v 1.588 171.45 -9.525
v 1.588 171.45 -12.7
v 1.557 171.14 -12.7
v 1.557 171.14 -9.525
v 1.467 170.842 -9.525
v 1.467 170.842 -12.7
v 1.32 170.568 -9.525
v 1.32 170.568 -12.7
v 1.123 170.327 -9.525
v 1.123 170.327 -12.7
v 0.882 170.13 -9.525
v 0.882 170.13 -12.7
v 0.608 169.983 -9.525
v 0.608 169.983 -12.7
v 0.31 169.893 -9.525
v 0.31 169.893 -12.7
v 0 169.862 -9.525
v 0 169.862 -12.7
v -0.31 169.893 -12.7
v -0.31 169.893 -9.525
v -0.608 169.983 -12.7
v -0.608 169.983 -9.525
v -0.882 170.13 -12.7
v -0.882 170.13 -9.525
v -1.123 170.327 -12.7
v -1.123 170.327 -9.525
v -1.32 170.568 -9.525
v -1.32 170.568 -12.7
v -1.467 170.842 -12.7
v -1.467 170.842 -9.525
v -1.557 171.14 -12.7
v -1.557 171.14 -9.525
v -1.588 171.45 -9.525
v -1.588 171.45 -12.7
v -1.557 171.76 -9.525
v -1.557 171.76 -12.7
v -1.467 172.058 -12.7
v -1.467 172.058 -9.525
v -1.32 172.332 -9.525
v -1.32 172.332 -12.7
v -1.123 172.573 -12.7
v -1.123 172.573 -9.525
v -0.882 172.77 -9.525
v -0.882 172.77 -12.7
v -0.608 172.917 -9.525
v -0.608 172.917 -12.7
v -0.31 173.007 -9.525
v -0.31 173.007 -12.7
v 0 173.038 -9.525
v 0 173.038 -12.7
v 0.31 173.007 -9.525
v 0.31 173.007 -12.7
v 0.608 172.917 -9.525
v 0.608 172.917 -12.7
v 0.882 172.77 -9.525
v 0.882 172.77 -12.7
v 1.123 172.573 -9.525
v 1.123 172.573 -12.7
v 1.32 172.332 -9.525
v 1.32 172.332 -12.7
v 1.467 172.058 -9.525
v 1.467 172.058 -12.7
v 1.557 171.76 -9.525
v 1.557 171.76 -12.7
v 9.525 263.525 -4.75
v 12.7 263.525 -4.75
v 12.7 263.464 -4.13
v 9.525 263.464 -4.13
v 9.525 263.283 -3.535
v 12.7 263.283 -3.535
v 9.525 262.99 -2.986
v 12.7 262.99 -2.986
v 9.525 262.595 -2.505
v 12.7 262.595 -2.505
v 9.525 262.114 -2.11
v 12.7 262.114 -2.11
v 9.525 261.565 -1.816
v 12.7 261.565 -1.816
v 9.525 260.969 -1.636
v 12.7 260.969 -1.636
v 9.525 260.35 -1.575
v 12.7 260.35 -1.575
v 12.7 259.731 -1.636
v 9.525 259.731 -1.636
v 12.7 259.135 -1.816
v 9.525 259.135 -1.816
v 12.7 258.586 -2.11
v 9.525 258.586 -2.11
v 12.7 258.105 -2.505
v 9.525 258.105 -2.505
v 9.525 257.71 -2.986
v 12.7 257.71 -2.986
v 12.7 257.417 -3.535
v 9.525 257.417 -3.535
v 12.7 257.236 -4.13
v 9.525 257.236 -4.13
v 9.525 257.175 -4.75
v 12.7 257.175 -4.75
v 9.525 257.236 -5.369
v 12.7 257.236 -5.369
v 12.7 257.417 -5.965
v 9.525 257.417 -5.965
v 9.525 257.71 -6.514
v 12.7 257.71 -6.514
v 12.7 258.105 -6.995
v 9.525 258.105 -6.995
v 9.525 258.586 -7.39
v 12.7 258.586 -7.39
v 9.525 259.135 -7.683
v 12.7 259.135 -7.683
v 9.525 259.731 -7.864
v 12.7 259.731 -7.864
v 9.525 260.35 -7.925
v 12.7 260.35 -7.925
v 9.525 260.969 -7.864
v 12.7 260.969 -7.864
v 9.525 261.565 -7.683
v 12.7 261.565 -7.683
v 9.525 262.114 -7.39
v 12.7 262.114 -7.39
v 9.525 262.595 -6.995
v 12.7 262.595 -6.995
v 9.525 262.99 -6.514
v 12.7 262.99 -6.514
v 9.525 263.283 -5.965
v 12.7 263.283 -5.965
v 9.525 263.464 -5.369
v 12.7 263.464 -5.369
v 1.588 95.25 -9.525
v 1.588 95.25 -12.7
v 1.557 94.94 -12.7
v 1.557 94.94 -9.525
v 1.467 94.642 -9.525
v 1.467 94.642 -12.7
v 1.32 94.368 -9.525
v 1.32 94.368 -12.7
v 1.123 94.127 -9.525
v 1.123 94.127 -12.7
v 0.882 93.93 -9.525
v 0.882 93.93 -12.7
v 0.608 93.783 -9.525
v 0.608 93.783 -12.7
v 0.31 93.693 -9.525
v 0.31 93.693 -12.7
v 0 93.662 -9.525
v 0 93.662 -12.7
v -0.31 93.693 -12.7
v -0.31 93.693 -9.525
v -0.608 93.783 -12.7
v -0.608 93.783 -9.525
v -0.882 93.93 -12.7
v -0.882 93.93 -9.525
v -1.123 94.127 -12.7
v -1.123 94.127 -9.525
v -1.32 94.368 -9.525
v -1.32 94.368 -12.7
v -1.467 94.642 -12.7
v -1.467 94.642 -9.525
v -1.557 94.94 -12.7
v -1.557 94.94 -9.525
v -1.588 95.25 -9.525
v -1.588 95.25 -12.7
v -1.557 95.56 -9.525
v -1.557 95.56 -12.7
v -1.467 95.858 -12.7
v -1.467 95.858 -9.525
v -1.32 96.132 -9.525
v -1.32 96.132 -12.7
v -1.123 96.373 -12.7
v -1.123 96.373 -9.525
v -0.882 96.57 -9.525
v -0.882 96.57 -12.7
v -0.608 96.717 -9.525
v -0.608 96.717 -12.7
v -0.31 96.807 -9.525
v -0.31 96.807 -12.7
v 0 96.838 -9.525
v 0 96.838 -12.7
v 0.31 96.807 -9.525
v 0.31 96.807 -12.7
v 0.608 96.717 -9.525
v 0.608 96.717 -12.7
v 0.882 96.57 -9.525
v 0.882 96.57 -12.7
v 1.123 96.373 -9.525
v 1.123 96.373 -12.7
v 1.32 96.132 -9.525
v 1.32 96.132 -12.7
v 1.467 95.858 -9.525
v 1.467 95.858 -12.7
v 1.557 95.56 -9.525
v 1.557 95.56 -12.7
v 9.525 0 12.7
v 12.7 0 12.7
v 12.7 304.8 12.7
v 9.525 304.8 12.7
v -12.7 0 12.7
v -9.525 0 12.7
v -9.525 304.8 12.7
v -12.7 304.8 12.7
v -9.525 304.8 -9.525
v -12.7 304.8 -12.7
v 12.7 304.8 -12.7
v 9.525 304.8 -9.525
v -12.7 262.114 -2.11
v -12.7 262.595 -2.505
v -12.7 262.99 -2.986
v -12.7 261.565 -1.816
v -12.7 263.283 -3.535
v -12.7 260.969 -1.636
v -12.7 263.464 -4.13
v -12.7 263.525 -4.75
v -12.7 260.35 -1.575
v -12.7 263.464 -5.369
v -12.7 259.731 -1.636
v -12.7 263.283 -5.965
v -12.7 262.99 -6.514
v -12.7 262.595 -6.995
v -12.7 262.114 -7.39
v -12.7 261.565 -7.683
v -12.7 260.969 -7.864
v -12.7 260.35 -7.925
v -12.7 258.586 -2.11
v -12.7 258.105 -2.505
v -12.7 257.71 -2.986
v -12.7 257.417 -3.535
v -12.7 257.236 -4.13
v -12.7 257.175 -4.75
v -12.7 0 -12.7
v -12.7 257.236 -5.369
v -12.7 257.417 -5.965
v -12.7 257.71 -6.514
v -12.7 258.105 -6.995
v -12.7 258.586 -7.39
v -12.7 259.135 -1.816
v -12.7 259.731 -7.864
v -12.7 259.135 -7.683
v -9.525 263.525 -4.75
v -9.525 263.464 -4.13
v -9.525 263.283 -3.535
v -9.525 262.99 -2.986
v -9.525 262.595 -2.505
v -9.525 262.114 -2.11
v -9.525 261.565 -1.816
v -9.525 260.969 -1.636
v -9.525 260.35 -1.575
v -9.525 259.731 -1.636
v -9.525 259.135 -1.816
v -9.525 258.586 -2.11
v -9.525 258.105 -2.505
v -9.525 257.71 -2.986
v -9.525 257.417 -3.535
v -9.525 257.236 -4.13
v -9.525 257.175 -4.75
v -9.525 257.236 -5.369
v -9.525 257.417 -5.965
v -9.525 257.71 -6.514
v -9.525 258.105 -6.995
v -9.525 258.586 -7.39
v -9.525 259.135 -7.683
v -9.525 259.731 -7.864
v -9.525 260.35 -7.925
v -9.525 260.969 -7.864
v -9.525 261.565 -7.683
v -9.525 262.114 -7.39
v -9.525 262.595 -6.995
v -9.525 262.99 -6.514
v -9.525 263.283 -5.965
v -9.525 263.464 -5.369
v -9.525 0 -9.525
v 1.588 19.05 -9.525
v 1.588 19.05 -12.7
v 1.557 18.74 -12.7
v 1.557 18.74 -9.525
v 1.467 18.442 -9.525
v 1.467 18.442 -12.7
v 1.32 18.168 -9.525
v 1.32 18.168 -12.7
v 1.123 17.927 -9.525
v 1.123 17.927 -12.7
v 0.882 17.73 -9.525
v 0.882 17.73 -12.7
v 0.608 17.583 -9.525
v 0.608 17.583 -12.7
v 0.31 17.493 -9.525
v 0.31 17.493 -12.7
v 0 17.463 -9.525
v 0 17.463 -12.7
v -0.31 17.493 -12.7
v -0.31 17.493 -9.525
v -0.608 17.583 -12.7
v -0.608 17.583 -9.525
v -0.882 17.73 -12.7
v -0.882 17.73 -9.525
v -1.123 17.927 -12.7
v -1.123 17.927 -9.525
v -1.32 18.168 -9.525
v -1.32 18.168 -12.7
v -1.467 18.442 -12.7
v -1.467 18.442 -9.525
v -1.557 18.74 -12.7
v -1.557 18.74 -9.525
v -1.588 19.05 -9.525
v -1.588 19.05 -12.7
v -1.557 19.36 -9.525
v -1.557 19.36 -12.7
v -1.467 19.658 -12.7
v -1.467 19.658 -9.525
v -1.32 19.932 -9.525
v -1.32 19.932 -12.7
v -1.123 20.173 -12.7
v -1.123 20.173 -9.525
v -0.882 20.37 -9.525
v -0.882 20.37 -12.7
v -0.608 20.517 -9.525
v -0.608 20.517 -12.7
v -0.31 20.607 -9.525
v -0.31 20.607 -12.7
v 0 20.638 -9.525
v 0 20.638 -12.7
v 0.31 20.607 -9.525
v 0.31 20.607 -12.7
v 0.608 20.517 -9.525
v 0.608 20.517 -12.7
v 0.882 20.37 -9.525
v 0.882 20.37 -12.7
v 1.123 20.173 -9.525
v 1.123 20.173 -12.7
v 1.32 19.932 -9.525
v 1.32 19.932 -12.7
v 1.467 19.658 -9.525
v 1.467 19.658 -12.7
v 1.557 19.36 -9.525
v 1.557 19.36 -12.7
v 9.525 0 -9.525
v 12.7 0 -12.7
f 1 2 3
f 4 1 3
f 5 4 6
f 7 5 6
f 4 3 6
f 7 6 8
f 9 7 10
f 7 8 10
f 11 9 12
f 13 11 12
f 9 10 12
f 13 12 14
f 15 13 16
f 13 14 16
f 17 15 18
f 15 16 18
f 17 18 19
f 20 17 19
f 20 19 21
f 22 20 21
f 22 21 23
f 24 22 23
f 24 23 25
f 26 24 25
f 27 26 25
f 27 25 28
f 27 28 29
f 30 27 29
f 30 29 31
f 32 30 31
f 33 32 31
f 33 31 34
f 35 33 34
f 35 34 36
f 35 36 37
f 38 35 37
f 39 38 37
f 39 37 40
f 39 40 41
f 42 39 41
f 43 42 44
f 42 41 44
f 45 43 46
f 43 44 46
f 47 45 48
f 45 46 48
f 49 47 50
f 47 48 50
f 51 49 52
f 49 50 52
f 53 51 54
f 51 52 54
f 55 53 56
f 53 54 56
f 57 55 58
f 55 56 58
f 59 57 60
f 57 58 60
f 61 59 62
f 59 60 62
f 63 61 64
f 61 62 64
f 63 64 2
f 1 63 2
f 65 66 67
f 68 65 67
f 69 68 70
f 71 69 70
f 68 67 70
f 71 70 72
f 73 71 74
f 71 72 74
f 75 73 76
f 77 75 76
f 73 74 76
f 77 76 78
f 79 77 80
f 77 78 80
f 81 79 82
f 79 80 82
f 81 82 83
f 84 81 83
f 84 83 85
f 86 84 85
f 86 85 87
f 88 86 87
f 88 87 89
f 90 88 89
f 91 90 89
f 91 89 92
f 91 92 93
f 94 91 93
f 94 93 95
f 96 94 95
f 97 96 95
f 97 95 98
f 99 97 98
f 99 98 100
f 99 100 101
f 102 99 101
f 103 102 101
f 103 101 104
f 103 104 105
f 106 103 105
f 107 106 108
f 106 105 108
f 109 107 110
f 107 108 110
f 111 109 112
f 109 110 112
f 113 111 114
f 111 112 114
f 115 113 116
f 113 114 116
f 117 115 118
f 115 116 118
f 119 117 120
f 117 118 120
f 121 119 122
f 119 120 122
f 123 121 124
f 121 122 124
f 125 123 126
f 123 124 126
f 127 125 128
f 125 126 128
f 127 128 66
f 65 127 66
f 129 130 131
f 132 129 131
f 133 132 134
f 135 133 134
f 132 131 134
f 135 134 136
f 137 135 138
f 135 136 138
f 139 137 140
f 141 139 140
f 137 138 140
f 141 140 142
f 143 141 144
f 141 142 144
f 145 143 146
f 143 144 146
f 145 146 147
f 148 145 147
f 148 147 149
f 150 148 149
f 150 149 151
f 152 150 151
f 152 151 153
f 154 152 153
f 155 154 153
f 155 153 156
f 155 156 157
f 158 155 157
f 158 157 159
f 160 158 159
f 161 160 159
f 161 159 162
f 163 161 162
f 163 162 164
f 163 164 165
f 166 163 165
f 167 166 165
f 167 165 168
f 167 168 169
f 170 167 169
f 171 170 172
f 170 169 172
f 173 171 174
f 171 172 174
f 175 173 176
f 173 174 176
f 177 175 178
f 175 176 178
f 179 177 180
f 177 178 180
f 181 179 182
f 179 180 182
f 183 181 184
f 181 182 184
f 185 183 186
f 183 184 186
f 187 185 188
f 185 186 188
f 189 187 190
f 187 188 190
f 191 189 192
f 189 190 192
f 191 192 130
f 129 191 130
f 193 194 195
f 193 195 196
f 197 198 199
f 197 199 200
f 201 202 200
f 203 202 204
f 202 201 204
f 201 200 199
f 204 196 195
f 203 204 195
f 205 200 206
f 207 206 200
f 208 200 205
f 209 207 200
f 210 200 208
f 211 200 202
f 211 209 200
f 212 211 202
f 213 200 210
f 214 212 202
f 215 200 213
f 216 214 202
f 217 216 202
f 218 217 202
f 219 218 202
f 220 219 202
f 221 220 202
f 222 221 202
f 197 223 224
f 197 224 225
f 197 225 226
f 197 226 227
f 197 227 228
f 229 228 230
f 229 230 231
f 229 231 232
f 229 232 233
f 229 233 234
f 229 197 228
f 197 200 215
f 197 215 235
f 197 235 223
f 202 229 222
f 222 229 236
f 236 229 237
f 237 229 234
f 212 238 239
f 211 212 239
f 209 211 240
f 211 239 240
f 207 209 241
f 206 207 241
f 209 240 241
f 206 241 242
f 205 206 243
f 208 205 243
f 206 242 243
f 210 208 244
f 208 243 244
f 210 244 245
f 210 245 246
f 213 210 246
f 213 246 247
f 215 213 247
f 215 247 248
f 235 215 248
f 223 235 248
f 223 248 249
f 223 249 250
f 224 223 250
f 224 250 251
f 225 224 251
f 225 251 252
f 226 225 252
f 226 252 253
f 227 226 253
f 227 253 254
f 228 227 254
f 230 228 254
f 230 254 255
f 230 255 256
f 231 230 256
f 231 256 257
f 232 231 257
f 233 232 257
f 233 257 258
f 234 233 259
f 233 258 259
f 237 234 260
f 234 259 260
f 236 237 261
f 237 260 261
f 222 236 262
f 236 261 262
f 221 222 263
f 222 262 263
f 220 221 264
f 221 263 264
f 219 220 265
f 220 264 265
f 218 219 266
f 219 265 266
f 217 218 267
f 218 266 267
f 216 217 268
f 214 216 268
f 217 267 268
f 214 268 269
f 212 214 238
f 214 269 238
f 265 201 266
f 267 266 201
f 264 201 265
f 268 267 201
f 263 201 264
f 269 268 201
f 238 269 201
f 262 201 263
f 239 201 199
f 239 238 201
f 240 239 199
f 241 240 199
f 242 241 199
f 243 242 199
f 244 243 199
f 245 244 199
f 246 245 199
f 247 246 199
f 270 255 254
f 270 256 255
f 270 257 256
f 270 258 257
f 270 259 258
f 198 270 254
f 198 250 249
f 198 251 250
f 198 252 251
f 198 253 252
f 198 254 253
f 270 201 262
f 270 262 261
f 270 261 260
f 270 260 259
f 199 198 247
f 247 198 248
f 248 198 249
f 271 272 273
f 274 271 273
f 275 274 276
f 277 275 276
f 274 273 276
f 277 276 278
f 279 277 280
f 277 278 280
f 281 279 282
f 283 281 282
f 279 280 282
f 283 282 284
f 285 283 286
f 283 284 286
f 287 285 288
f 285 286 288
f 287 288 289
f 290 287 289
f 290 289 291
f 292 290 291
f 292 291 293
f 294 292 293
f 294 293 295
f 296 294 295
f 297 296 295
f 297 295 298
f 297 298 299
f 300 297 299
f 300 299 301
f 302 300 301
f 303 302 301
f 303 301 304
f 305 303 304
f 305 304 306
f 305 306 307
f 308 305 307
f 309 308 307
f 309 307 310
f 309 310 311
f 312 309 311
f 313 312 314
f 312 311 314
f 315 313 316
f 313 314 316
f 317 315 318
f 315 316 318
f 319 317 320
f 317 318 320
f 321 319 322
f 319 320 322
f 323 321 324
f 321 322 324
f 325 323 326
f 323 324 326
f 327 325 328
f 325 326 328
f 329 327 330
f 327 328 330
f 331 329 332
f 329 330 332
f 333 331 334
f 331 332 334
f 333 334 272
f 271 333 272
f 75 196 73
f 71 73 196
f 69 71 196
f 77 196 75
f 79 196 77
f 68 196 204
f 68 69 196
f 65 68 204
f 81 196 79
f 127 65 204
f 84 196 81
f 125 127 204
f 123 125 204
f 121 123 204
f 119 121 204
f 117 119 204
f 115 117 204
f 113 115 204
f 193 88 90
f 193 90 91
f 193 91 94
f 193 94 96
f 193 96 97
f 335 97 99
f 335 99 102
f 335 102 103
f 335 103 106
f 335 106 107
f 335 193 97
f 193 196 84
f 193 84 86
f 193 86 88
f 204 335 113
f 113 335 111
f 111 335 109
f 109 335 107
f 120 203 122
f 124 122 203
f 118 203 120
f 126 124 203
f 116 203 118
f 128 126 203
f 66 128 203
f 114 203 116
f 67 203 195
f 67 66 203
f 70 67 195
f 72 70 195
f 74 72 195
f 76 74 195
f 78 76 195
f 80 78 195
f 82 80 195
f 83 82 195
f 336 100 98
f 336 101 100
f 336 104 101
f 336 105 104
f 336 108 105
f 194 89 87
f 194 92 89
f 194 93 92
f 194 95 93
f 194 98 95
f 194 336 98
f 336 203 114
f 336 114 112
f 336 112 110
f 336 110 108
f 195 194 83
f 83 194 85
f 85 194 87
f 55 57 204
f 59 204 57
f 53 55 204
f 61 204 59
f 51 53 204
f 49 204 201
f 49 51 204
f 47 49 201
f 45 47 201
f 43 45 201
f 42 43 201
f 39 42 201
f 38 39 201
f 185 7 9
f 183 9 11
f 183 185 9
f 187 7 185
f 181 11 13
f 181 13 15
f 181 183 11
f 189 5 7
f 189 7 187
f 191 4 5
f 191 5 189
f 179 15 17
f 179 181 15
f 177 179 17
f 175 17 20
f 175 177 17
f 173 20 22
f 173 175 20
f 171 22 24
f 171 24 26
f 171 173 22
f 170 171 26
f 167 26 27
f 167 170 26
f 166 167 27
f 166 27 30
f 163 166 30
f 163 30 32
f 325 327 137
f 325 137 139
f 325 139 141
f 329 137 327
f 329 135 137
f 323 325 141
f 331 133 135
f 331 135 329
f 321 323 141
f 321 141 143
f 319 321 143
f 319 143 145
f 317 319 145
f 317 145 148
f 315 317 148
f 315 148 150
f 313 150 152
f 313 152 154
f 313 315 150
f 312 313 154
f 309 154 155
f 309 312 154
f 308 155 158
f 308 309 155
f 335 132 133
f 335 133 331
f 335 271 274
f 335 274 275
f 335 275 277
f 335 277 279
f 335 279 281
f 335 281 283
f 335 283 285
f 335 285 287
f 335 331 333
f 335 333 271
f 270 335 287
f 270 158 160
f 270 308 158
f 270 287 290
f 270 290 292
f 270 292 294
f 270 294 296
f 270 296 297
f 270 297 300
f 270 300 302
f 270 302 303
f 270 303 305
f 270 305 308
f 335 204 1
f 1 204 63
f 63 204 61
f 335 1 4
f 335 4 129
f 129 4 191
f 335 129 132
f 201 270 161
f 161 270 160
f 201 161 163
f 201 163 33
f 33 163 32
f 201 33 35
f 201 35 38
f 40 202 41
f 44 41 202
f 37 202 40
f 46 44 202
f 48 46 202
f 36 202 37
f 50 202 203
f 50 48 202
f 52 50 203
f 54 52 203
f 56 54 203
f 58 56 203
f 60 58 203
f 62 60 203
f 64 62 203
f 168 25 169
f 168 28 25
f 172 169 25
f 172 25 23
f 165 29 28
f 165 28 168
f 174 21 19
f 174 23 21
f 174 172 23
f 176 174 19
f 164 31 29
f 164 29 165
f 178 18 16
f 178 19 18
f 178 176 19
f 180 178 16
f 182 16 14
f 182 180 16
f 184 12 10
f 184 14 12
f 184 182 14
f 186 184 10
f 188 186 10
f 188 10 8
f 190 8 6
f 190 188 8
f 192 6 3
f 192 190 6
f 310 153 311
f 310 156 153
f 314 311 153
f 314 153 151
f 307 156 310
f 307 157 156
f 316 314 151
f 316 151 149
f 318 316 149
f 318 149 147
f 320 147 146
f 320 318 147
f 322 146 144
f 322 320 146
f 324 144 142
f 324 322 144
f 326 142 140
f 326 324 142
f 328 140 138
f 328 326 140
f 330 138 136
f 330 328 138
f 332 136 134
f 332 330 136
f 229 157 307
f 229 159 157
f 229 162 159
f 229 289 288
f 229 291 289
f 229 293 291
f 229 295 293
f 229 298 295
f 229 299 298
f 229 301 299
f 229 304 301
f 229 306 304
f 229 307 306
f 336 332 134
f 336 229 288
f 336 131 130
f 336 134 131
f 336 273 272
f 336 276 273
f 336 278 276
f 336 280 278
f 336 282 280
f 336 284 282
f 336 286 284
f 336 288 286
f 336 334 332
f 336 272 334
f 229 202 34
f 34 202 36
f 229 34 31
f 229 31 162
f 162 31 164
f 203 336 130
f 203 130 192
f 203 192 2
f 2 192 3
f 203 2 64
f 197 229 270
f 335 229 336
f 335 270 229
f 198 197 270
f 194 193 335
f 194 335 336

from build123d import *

# Parameters (mm, degrees)
F1_DEPTH = 304.8
F2_R     = 3.175
F3_DEPTH = 25.4
F4_R     = 1.5875
F5_DEPTH = 25.4


with BuildPart() as f1:
    # F0 (on Front) → F1 (new body)
    with BuildSketch(Plane.XZ):
        Polygon((-9.525, 12.7), (-12.7, 12.7), (-12.7, -12.7), (12.7, -12.7), (12.7, 12.7), (9.525, 12.7), (9.525, -9.525), (-9.525, -9.525), align=None)
    extrude(amount=-F1_DEPTH)

    # F2 (on face) → F3 (cut, through all)
    with BuildSketch(Plane.YZ.offset(12.7)):
        with Locations((260.35, -4.7498)):
            Circle(F2_R)
    extrude(amount=-F3_DEPTH, mode=Mode.SUBTRACT)

    # F4 (on face) → F5 (cut)
    with BuildSketch(Plane(origin=(0, 0, -12.7), x_dir=(1, 0, 0), z_dir=(0, 0, -1))):
        with Locations((0, -19.05)):
            Circle(F4_R)
        with Locations((0, -95.25)):
            Circle(F4_R)
        with Locations((0, -171.45)):
            Circle(F4_R)
    extrude(amount=-F5_DEPTH, mode=Mode.SUBTRACT)


solid = f1.part
